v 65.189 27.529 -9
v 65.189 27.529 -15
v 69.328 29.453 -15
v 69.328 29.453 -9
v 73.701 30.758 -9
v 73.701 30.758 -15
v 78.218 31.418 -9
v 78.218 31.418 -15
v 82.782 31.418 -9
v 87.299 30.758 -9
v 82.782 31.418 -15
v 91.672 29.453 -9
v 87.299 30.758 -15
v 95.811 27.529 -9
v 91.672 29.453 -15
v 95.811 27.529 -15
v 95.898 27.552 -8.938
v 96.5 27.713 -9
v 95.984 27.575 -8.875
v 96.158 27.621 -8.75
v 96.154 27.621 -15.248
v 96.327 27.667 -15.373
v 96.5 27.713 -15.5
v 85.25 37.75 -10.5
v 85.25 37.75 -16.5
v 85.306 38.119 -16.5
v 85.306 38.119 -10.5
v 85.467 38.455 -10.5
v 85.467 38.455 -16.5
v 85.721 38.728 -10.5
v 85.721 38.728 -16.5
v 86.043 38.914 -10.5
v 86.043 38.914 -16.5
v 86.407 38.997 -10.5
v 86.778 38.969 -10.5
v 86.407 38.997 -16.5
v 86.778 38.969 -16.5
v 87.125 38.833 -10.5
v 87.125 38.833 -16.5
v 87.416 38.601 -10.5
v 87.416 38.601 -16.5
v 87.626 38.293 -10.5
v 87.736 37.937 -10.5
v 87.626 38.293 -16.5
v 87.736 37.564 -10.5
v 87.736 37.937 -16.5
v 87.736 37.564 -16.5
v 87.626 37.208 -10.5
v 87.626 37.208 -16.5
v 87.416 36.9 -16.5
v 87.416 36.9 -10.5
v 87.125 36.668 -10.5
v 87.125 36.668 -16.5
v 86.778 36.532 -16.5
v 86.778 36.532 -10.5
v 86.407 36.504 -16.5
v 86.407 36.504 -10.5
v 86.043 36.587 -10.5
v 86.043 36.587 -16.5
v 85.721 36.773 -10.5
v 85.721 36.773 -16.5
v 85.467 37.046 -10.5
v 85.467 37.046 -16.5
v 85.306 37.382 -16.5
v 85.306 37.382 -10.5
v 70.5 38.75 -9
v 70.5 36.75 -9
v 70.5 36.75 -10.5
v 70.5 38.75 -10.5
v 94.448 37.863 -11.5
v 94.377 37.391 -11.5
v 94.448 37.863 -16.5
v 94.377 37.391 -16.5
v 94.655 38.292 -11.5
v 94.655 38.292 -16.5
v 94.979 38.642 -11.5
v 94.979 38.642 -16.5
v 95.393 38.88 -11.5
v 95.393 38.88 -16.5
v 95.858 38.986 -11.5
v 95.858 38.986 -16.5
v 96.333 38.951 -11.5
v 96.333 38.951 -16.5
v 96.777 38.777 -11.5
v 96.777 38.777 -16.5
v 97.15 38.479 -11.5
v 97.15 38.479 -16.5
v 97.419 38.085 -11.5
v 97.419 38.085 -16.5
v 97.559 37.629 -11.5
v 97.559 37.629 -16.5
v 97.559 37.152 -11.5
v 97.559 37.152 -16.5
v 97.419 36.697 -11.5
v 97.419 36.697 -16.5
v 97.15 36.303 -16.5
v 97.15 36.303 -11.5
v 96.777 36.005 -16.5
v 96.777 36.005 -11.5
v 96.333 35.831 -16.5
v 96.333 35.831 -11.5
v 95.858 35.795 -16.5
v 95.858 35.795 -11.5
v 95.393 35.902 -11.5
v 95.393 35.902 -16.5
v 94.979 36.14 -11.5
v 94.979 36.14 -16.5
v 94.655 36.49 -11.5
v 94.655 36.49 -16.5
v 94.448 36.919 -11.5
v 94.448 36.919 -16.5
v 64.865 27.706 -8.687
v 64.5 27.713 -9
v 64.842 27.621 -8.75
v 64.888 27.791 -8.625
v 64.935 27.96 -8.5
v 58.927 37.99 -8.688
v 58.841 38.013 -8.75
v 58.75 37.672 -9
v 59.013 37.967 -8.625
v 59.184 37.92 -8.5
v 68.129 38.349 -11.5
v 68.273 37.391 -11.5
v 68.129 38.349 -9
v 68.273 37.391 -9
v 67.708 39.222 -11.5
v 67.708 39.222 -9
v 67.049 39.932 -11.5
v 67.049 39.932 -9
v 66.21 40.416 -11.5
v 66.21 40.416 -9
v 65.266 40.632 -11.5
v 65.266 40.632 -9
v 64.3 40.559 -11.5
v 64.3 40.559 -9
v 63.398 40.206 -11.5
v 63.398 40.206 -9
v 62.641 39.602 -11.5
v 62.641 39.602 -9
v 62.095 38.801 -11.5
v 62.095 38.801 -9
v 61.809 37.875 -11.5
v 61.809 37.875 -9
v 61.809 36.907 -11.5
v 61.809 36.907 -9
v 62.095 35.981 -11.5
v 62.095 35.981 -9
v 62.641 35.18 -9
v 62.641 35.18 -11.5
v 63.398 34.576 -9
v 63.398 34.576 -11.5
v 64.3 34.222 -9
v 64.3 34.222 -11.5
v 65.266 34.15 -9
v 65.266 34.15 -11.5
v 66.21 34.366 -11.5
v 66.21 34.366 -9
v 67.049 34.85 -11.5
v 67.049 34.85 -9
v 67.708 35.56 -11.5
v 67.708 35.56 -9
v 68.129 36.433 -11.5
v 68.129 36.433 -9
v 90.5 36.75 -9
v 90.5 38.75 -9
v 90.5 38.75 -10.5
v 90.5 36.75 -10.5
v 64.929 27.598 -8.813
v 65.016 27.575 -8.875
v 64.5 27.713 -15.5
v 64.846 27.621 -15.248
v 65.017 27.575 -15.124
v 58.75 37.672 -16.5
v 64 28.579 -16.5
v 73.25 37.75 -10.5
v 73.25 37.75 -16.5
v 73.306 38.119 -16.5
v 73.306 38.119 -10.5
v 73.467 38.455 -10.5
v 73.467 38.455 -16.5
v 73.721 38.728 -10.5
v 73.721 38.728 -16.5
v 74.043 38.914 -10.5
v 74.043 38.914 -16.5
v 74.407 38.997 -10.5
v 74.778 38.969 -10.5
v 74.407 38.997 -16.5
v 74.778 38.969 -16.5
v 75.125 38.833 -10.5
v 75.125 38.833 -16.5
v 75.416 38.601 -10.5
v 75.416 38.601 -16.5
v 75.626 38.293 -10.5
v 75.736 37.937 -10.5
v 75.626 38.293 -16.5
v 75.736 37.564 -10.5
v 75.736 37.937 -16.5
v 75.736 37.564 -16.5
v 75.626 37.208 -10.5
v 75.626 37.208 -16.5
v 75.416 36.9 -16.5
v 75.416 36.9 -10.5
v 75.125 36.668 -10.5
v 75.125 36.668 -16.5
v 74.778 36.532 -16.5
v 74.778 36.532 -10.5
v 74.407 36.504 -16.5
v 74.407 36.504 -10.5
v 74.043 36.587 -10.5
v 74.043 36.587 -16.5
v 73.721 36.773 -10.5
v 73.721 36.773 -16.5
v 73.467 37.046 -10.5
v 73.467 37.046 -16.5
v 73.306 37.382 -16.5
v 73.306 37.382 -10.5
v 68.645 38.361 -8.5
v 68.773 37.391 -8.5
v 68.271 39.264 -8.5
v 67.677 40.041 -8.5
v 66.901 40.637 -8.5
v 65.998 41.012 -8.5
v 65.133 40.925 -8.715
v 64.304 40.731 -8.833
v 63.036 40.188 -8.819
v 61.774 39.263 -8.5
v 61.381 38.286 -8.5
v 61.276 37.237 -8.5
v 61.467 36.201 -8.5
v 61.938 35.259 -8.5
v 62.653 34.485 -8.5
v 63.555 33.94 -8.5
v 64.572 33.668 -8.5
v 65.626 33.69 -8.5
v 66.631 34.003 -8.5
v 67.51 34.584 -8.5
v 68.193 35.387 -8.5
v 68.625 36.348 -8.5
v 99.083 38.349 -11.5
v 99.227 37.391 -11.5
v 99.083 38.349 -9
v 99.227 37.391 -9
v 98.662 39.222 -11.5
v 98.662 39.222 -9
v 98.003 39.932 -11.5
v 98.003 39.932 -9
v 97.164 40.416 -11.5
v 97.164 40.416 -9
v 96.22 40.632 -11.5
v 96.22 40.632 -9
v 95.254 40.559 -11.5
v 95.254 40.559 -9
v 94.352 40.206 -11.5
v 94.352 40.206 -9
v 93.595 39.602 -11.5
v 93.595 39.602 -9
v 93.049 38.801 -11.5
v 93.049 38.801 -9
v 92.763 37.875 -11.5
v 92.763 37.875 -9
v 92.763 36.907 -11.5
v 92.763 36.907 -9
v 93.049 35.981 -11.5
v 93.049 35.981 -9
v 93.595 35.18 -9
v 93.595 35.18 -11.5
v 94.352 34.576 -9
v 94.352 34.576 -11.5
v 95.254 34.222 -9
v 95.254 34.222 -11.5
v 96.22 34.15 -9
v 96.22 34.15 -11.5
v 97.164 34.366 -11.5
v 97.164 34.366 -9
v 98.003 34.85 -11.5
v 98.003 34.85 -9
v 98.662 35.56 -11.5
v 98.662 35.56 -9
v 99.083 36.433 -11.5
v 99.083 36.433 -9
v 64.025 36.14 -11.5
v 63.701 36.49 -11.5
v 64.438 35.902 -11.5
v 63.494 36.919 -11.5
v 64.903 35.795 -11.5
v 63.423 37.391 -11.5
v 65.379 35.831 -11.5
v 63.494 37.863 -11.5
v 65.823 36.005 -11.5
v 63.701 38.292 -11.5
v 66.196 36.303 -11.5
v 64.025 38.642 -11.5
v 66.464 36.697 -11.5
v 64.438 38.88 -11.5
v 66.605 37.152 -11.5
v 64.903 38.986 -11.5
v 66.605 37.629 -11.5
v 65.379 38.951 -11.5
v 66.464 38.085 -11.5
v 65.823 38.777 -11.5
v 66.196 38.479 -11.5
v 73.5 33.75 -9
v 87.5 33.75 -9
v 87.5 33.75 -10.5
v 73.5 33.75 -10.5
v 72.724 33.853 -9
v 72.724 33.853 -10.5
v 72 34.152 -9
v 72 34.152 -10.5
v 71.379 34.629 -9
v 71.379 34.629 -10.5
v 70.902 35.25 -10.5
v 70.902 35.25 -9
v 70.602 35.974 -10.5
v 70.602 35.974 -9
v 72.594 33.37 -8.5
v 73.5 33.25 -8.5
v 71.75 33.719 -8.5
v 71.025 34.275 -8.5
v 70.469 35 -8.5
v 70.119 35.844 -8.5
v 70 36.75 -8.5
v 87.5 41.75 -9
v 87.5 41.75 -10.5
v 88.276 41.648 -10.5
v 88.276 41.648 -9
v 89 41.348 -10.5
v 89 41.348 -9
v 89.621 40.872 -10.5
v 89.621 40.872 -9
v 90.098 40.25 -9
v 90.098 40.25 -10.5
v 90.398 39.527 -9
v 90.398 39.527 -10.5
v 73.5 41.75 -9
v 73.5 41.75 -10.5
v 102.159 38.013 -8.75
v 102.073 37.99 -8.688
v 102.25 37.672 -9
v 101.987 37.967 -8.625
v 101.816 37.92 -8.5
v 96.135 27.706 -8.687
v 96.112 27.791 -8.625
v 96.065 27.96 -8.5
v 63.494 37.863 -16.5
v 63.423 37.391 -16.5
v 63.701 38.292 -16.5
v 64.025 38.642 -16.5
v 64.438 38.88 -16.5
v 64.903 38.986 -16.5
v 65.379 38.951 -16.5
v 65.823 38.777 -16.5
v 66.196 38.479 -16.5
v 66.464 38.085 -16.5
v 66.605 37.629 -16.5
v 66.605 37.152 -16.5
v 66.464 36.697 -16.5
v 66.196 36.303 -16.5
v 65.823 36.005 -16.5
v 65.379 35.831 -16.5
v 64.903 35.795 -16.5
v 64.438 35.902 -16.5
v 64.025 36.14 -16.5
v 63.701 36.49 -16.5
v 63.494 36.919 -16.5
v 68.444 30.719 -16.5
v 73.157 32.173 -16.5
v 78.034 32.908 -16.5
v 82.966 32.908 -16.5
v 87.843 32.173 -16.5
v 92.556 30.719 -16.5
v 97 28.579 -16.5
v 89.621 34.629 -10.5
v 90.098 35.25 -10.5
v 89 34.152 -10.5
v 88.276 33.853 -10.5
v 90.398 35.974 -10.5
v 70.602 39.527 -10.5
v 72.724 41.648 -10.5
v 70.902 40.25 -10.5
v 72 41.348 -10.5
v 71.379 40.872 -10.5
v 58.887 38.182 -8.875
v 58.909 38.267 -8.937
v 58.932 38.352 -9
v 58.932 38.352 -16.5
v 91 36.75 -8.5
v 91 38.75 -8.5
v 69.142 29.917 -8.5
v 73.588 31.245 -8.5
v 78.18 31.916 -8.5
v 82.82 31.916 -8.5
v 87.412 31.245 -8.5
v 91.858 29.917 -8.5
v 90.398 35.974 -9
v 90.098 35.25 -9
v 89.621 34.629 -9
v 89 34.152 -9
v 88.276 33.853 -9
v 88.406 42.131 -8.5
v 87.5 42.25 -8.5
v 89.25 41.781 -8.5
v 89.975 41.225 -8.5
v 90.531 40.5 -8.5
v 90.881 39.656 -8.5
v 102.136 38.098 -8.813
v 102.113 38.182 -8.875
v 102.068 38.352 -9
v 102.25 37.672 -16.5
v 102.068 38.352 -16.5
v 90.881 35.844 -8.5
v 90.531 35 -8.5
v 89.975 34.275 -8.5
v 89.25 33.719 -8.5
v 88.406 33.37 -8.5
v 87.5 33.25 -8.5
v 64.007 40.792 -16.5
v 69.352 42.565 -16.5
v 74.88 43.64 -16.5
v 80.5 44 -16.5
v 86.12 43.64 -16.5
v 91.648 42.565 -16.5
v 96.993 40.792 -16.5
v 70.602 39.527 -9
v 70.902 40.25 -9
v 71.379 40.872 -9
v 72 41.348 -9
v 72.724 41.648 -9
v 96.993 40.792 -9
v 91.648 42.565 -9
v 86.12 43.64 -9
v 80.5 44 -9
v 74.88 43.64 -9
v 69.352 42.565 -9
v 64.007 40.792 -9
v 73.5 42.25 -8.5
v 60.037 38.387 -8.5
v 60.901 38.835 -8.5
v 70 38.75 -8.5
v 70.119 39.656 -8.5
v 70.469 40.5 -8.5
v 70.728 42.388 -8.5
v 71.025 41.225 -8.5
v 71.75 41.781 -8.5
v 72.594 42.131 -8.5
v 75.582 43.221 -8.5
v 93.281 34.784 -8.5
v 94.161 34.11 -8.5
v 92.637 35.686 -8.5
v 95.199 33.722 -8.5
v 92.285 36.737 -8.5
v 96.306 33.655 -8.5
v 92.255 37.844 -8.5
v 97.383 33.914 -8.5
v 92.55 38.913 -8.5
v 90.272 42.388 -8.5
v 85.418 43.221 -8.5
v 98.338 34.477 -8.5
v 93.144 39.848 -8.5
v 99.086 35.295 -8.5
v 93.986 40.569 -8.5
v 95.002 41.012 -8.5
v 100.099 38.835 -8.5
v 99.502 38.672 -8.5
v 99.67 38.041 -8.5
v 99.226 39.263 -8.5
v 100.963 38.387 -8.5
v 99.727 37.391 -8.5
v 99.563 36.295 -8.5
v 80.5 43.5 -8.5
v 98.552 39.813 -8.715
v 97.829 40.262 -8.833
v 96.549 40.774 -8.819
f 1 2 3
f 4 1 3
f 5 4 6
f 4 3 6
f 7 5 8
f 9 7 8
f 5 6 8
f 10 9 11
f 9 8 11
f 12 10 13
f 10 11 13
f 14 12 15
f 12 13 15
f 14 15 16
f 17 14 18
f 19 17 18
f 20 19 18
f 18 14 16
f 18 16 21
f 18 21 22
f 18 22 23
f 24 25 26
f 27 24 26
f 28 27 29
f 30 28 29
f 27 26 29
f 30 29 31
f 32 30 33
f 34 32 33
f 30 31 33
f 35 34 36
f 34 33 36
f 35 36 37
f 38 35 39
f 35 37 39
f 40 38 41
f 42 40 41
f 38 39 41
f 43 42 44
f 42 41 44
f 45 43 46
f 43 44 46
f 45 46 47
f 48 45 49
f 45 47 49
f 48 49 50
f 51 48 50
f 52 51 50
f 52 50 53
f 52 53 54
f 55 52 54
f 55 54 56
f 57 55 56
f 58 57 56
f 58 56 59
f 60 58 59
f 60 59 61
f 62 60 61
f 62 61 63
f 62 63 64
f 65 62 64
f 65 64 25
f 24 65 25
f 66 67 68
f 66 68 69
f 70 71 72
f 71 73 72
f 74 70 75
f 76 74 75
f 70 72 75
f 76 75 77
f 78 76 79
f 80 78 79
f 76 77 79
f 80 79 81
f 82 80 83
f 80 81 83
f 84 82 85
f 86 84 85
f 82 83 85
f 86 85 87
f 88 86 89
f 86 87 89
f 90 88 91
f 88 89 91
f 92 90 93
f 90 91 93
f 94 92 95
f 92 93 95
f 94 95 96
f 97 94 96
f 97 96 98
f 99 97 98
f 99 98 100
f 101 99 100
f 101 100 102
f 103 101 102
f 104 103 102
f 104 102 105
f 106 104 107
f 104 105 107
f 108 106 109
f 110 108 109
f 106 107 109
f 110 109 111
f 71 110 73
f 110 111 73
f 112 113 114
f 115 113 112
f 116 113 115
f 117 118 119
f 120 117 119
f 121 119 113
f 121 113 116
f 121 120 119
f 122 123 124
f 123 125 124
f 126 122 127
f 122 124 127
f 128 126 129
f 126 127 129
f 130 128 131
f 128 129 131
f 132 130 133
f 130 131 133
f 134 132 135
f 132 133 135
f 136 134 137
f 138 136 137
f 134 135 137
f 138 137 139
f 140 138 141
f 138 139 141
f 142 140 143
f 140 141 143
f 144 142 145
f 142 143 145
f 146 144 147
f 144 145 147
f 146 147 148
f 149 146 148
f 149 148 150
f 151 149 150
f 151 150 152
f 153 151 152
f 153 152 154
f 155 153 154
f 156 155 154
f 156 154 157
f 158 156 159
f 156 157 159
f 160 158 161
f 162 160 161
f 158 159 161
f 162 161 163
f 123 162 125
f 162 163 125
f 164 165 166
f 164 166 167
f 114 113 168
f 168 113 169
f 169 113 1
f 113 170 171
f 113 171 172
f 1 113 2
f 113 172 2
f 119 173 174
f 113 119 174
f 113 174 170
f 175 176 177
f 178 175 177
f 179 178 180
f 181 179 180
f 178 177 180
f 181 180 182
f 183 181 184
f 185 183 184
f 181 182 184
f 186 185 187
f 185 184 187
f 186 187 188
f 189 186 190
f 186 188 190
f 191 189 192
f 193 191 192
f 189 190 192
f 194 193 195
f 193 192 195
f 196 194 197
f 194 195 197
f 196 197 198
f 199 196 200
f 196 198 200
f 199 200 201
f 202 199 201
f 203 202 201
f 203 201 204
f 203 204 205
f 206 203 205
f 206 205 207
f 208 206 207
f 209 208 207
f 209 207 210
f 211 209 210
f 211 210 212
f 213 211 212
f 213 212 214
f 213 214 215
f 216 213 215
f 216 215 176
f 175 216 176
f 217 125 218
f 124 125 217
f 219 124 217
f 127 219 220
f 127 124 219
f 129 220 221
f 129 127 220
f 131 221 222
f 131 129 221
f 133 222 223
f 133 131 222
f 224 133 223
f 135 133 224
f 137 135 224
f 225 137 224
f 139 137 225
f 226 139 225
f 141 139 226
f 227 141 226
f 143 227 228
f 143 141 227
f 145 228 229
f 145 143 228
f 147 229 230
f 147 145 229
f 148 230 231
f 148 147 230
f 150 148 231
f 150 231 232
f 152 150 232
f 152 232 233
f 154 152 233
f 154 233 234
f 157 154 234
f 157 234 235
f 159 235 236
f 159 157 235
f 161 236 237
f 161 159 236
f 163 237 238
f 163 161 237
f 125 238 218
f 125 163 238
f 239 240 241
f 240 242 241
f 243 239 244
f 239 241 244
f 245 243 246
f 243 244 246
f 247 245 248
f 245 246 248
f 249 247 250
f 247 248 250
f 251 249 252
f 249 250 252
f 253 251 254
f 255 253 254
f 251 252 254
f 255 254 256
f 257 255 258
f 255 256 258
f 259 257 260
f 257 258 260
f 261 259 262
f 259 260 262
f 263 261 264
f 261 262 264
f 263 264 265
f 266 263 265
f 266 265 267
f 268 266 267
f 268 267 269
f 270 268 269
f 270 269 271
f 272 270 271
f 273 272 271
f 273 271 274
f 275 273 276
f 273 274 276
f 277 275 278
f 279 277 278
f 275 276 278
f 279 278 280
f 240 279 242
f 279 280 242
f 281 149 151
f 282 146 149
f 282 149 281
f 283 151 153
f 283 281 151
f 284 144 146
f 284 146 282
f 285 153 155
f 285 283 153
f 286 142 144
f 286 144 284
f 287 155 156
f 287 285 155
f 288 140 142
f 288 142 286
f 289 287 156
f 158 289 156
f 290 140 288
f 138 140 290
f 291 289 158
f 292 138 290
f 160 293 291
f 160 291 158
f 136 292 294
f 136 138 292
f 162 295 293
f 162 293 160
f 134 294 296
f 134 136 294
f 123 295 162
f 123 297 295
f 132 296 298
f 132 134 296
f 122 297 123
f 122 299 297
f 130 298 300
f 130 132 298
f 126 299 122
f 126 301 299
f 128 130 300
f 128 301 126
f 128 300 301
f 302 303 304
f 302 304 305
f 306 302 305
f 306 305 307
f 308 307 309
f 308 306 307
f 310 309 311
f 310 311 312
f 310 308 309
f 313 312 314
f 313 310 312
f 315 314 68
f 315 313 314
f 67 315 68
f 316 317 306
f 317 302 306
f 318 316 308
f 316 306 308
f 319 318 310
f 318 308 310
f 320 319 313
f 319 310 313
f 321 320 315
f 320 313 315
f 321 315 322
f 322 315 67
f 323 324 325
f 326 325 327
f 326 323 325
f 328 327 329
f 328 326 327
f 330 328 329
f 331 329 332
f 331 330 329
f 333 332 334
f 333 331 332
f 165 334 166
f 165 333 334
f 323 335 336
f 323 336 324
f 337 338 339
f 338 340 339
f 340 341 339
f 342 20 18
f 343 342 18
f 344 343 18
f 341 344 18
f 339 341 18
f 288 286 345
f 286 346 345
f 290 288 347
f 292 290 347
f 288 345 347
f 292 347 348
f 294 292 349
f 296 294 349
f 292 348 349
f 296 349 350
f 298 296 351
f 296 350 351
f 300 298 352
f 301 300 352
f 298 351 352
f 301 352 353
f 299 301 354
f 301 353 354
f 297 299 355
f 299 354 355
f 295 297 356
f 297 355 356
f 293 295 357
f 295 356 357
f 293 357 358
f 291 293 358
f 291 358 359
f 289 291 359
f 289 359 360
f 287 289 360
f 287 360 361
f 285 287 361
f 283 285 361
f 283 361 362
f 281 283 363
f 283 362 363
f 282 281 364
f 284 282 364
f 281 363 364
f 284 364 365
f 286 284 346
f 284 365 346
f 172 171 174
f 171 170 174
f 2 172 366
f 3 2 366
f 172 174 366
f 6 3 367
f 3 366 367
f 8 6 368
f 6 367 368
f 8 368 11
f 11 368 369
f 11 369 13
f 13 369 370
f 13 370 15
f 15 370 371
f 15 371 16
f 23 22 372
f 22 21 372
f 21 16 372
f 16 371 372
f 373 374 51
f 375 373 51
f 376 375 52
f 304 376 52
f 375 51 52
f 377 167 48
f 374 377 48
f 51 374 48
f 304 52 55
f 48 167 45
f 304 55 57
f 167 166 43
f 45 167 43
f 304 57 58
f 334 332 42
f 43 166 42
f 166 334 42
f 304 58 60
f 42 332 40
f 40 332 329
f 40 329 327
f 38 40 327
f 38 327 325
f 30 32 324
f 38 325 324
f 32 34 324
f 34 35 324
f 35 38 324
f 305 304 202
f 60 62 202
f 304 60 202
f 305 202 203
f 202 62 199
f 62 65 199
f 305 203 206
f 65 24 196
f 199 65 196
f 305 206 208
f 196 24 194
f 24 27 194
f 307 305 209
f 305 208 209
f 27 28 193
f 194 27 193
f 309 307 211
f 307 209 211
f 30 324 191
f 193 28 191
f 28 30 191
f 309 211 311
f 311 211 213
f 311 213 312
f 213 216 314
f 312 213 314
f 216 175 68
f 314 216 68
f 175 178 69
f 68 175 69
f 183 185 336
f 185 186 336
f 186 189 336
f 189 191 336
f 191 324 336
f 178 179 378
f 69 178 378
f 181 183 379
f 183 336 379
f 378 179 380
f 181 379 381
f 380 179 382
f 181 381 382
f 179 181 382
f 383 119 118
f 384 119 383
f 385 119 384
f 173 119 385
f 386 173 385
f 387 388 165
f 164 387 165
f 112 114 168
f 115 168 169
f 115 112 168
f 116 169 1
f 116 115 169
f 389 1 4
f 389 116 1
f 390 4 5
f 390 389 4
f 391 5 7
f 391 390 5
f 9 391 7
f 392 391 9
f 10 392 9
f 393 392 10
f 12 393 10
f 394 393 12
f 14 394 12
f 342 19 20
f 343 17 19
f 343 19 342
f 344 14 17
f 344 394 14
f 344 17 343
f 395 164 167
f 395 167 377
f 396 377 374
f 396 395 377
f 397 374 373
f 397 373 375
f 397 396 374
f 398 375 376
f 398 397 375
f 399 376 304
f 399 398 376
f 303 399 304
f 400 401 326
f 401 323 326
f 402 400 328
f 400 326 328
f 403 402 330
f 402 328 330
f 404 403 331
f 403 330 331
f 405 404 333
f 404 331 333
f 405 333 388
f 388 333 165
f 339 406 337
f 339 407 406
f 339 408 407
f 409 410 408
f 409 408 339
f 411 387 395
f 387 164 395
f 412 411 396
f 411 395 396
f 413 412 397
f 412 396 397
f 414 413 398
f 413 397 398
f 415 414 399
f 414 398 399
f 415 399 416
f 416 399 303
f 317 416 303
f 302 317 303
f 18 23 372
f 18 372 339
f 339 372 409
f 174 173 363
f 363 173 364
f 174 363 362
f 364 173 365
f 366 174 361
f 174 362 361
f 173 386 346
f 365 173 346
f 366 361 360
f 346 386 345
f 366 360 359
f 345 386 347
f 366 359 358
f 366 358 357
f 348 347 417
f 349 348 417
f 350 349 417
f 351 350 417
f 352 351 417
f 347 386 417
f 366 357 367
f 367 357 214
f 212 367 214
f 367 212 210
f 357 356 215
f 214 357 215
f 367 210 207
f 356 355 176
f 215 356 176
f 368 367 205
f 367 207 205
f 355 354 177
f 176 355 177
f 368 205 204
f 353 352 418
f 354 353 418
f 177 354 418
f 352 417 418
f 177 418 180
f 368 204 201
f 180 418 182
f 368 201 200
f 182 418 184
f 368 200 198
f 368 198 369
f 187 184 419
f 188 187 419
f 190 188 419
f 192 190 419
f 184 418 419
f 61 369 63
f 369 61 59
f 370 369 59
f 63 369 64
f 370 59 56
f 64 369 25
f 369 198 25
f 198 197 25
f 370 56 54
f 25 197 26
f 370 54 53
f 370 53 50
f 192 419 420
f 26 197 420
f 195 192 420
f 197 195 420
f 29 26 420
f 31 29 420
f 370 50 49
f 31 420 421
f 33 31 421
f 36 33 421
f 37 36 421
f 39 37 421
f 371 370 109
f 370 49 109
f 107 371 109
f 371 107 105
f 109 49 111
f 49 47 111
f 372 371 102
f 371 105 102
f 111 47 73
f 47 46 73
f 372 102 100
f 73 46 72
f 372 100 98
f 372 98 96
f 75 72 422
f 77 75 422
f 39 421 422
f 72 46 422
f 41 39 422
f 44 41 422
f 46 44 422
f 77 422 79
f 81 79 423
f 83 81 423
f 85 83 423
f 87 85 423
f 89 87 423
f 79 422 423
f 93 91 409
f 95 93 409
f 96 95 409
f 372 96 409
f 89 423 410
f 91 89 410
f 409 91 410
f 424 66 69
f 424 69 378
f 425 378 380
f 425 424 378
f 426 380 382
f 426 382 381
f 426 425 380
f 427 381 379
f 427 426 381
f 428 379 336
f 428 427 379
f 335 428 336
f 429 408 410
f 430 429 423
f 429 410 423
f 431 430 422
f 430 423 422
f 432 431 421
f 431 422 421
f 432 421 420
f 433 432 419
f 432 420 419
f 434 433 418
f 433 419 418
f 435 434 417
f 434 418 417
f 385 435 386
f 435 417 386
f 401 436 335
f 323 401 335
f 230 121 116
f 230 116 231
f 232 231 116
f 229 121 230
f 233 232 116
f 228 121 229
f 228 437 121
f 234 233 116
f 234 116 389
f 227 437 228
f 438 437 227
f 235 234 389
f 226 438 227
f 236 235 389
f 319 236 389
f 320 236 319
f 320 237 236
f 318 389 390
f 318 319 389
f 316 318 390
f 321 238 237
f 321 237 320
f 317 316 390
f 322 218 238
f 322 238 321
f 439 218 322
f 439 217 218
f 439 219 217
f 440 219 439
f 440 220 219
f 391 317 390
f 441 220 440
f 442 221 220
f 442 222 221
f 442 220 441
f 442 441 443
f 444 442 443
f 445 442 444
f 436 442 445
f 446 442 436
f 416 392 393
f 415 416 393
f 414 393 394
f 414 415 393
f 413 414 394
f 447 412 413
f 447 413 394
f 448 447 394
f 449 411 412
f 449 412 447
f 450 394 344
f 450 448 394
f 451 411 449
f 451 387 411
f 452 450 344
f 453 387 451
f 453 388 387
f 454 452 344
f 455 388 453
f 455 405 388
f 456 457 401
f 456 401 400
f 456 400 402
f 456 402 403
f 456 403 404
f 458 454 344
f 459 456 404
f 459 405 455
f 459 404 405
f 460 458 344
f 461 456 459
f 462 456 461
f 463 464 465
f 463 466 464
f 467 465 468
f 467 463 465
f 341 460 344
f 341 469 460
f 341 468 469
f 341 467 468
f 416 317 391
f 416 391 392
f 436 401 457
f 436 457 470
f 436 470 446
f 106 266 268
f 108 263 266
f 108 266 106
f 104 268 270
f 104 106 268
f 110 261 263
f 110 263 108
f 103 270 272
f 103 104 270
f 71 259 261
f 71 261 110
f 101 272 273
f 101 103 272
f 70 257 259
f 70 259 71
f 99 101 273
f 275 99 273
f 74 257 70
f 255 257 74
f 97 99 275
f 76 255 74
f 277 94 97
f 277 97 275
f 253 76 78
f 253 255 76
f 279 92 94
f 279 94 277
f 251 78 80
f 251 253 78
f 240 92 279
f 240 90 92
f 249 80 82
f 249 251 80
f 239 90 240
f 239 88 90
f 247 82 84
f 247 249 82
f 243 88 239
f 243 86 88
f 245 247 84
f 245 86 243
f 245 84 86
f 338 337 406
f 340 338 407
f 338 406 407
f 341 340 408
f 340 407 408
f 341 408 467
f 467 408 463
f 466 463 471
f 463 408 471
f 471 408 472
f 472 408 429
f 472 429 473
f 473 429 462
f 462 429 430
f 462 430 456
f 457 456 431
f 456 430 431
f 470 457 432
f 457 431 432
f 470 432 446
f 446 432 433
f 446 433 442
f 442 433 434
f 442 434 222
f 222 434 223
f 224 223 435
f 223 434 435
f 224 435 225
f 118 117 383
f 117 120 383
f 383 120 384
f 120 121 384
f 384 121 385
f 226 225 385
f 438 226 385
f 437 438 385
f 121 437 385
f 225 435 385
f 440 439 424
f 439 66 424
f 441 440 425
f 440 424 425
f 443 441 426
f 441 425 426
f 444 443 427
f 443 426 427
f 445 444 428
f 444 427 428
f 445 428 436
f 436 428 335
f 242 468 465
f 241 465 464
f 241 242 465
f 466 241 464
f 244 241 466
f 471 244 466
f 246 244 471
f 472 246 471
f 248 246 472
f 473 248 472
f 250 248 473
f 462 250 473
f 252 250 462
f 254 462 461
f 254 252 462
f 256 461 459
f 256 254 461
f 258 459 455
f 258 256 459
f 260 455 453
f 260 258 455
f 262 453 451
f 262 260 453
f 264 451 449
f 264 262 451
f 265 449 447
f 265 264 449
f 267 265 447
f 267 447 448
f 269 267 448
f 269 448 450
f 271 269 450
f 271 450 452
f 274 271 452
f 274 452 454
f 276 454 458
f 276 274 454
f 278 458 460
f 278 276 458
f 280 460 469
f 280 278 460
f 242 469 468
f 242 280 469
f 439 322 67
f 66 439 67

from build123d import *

# Parameters (mm, degrees)
EXTRUDE_1_DEPTH              = 8
CHAMFER_7_SIZE               = 1.5
HOLE_WIZARD_M3_1_D           = 3.2
HOLE_WIZARD_M3_1_CBORE_D     = 6.5
HOLE_WIZARD_M3_1_CBORE_DEPTH = 3
CUT_EXTRUDE_6_DEPTH          = 2
CHAMFER_8_SIZE               = 0.5
CHAMFER_9_SIZE               = 0.5
M3X0_5_1_D                   = 2.5
M3X0_5_1_DEPTH               = 8.5
M3X0_5_1_TIP                 = 0.751075774


with BuildPart() as part:
    # ｽｹｯﾁ3 → ﾎﾞｽ - 押し出し1 (new body)
    with BuildSketch(Plane.XY.offset(-16.5)):
        with BuildLine():
            Line((58.49999999, 38.105482977), (64.74999999, 27.280165429))
            ThreePointArc((64.74999999, 27.280165429), (80.49999999, 31.50036521), (96.24999999, 27.280165429))
            Line((96.24999999, 27.280165429), (102.49999999, 38.105482977))
            ThreePointArc((102.49999999, 38.105482977), (80.49999999, 44.00036521), (58.49999999, 38.105482977))
        make_face()
    extrude(amount=EXTRUDE_1_DEPTH)

    # 面取り7
    chamfer_7_edges = [part.edges().sort_by_distance(p)[0] for p in [
        (80.49999999, 31.50036521, -16.5),
    ]]
    chamfer(chamfer_7_edges, length=CHAMFER_7_SIZE)

    # M3 穴付きねじ用座ぐり穴1 (through all)
    with Locations(Plane.XY.offset(-8.5)):
        with Locations((65.0229264, 37.390950693), (95.977073581, 37.390950693)):
            CounterBoreHole(HOLE_WIZARD_M3_1_D / 2, HOLE_WIZARD_M3_1_CBORE_D / 2, HOLE_WIZARD_M3_1_CBORE_DEPTH)

    # ｽｹｯﾁ17 → ｶｯﾄ - 押し出し6 (cut)
    with BuildSketch(Plane.XY.offset(-8.5)):
        with BuildLine():
            Line((73.49999999, 41.75036521), (87.49999999, 41.75036521))
            ThreePointArc((87.49999999, 41.75036521), (89.621320334, 40.871685554), (90.49999999, 38.75036521))
            Line((90.49999999, 38.75036521), (90.49999999, 36.75036521))
            ThreePointArc((90.49999999, 36.75036521), (89.621320334, 34.629044867), (87.49999999, 33.75036521))
            Line((87.49999999, 33.75036521), (73.49999999, 33.75036521))
            ThreePointArc((73.49999999, 33.75036521), (71.378679647, 34.629044867), (70.49999999, 36.75036521))
            Line((70.49999999, 36.75036521), (70.49999999, 38.75036521))
            ThreePointArc((70.49999999, 38.75036521), (71.378679647, 40.871685554), (73.49999999, 41.75036521))
        make_face()
    extrude(amount=-CUT_EXTRUDE_6_DEPTH, mode=Mode.SUBTRACT)

    # 面取り8
    # the kernel refuses this chamfer: 0.5 mm, written as the material it takes off along each edge
    with BuildSketch(Plane(origin=(80.49999999, 0.00036521, -8.5), x_dir=(-0.5349312949950591, 0.844895561377209, 0), z_dir=(-0.844895561377209, -0.5349312949950591, 0))) as chamfer_8_piece_1:
        Polygon((31.5, CHAMFER_8_SIZE), (31.5 + CHAMFER_8_SIZE, 0), (31.5, 0), align=None)
    revolve(axis=Axis((80.49999999, 0.00036521, -8.5), (0, 0, -1)), revolution_arc=64.678504259, mode=Mode.SUBTRACT)
    with BuildSketch(Plane(origin=(95.607079243, 26.16659403, -8.5), x_dir=(-0.8660254037844379, 0.5000000000000012, 0), z_dir=(0.5000000000000012, 0.866025403784438, 0))) as chamfer_8_piece_2:
        Polygon((CHAMFER_8_SIZE, 0), (0, -CHAMFER_8_SIZE), (0, 0), align=None)
    extrude(amount=15.071682988, mode=Mode.SUBTRACT)
    with BuildSketch(Plane(origin=(80.49999999, 0.00036521, -8.5), x_dir=(0.5250957878127545, 0.8510431326444641, 0), z_dir=(0.8510431326444641, -0.5250957878127545, 0))) as chamfer_8_piece_3:
        Polygon((44 - CHAMFER_8_SIZE, 0), (44, -CHAMFER_8_SIZE), (44, 0), align=None)
    revolve(axis=Axis((80.49999999, 0.00036521, -8.5), (0, 0, 1)), revolution_arc=63.349383731, mode=Mode.SUBTRACT)
    with BuildSketch(Plane(origin=(95.977073581, 37.390950693, -8.5), x_dir=(1, 0, 0), z_dir=(0, -1, 0))) as chamfer_8_piece_4:
        Polygon((3.25 + CHAMFER_8_SIZE, 0), (3.25, -CHAMFER_8_SIZE), (3.25, 0), align=None)
    revolve(axis=Axis((95.977073581, 37.390950693, -8.5), (0, 0, 1)), mode=Mode.SUBTRACT)
    with BuildSketch(Plane(origin=(65.0229264, 37.390950693, -8.5), x_dir=(1, 0, 0), z_dir=(0, -1, 0))) as chamfer_8_piece_5:
        Polygon((3.25 + CHAMFER_8_SIZE, 0), (3.25, -CHAMFER_8_SIZE), (3.25, 0), align=None)
    revolve(axis=Axis((65.0229264, 37.390950693, -8.5), (0, 0, 1)), mode=Mode.SUBTRACT)
    with BuildSketch(Plane(origin=(57.857079243, 39.219054376, -8.5), x_dir=(0, 0, -1), z_dir=(0.5000000000000007, -0.8660254037844384, 0))) as chamfer_8_piece_6:
        Polygon((CHAMFER_8_SIZE, 0), (0, CHAMFER_8_SIZE), (0, 0), align=None)
    extrude(amount=15.071682988, mode=Mode.SUBTRACT)
    with BuildSketch(Plane(origin=(87.49999999, 38.75036521, -8.5), x_dir=(0, 1, 0), z_dir=(-1, 0, 0))) as chamfer_8_piece_7:
        Polygon((3 + CHAMFER_8_SIZE, 0), (3, CHAMFER_8_SIZE), (3, 0), align=None)
    revolve(axis=Axis((87.49999999, 38.75036521, -8.5), (0, 0, -1)), revolution_arc=90, mode=Mode.SUBTRACT)
    with BuildSketch(Plane(origin=(73.49999999, 41.75036521, -8.5), x_dir=(0, 1, 0), z_dir=(1, 0, 0)), Plane(origin=(87.49999999, 33.75036521, -8.5), x_dir=(0, -1, 0), z_dir=(-1, 0, 0))) as chamfer_8_piece_8:
        Polygon((CHAMFER_8_SIZE, 0), (0, -CHAMFER_8_SIZE), (0, 0), align=None)
    extrude(amount=14, mode=Mode.SUBTRACT)
    with BuildSketch(Plane(origin=(73.49999999, 38.75036521, -8.5), x_dir=(-1, 0, 0), z_dir=(0, -1, 0))) as chamfer_8_piece_9:
        Polygon((3 + CHAMFER_8_SIZE, 0), (3, CHAMFER_8_SIZE), (3, 0), align=None)
    revolve(axis=Axis((73.49999999, 38.75036521, -8.5), (0, 0, -1)), revolution_arc=90, mode=Mode.SUBTRACT)
    with BuildSketch(Plane(origin=(70.49999999, 36.75036521, -8.5), x_dir=(-1, 0, 0), z_dir=(0, 1, 0)), Plane(origin=(90.49999999, 38.75036521, -8.5), x_dir=(1, 0, 0), z_dir=(0, -1, 0))) as chamfer_8_piece_10:
        Polygon((CHAMFER_8_SIZE, 0), (0, -CHAMFER_8_SIZE), (0, 0), align=None)
    extrude(amount=2, mode=Mode.SUBTRACT)
    with BuildSketch(Plane(origin=(73.49999999, 36.75036521, -8.5), x_dir=(0, -1, 0), z_dir=(1, 0, 0))) as chamfer_8_piece_11:
        Polygon((3 + CHAMFER_8_SIZE, 0), (3, CHAMFER_8_SIZE), (3, 0), align=None)
    revolve(axis=Axis((73.49999999, 36.75036521, -8.5), (0, 0, -1)), revolution_arc=90, mode=Mode.SUBTRACT)
    with BuildSketch(Plane(origin=(87.49999999, 36.75036521, -8.5), x_dir=(1, 0, 0), z_dir=(0, 1, 0))) as chamfer_8_piece_12:
        Polygon((3 + CHAMFER_8_SIZE, 0), (3, CHAMFER_8_SIZE), (3, 0), align=None)
    revolve(axis=Axis((87.49999999, 36.75036521, -8.5), (0, 0, -1)), revolution_arc=90, mode=Mode.SUBTRACT)

    # 面取り9
    # the kernel refuses this chamfer: 0.5 mm, written as the material it takes off along each edge
    with BuildSketch(Plane(origin=(96.24999999, 27.280165429, -16.296233904), x_dir=(-0.8699980733677616, 0.4930551209919465, 0), z_dir=(0, 0, 1))) as chamfer_9_piece_1:
        with BuildLine():
            Line((0.504048916, 0), (-CHAMFER_9_SIZE * 0.00800077643885, -CHAMFER_9_SIZE * 0.999967993276))
            Line((-CHAMFER_9_SIZE * 0.00800077643885, -CHAMFER_9_SIZE * 0.999967993276), (0, 0))
            ThreePointArc((0, 0), (0.259153689, -0.001007405), (0.504048916, 0))
        make_face()
    extrude(amount=8.592467809, mode=Mode.SUBTRACT)
    with BuildSketch(Plane(origin=(64.74999999, 27.280165429, -16.296233904), x_dir=(-0.499999999999999, 0.8660254037844393, 0), z_dir=(0, 0, 1))) as chamfer_9_piece_2:
        with BuildLine():
            Line((CHAMFER_9_SIZE, 0), (-0.004032783, -0.504032783))
            ThreePointArc((-0.004032783, -0.504032783), (-0.001066058, -0.259153454), (0, 0))
            Line((0, 0), (CHAMFER_9_SIZE, 0))
        make_face()
    extrude(amount=8.592467809, mode=Mode.SUBTRACT)
    with BuildSketch(Plane(origin=(58.49999999, 38.105482977, -17.785841494), x_dir=(0.5000000000000021, -0.8660254037844375, 0), z_dir=(0, 0, 1))) as chamfer_9_piece_3:
        with BuildLine():
            Line((CHAMFER_9_SIZE, 0), (0.002809166, 0.497190834))
            ThreePointArc((0.002809166, 0.497190834), (0.000742578, 0.255629249), (0, 0))
            Line((0, 0), (CHAMFER_9_SIZE, 0))
        make_face()
    extrude(amount=10.071682988, mode=Mode.SUBTRACT)
    with BuildSketch(Plane(origin=(102.49999999, 38.105482977, -17.785841494), x_dir=(-0.8688365739050292, 0.4950989879256175, 0), z_dir=(0, 0, 1))) as chamfer_9_piece_4:
        with BuildLine():
            Line((0.49719877, 0), (CHAMFER_9_SIZE * 0.00564998602096, CHAMFER_9_SIZE * 0.999984038702))
            Line((CHAMFER_9_SIZE * 0.00564998602096, CHAMFER_9_SIZE * 0.999984038702), (0, 0))
            ThreePointArc((0, 0), (0.255629364, -0.000701736), (0.49719877, 0))
        make_face()
    extrude(amount=10.071682988, mode=Mode.SUBTRACT)

    # M3x0.5 ねじ穴1
    with Locations(Plane.XY.offset(-10.5)):
        with Locations((74.49999999, 37.75036521), (86.49999999, 37.75036521)):
            Hole(M3X0_5_1_D / 2, depth=M3X0_5_1_DEPTH)
            with Locations((0, 0, -(M3X0_5_1_DEPTH + M3X0_5_1_TIP / 2))):  # 118° drill point
                Cone(0, M3X0_5_1_D / 2, M3X0_5_1_TIP, mode=Mode.SUBTRACT)


solid = part.part
